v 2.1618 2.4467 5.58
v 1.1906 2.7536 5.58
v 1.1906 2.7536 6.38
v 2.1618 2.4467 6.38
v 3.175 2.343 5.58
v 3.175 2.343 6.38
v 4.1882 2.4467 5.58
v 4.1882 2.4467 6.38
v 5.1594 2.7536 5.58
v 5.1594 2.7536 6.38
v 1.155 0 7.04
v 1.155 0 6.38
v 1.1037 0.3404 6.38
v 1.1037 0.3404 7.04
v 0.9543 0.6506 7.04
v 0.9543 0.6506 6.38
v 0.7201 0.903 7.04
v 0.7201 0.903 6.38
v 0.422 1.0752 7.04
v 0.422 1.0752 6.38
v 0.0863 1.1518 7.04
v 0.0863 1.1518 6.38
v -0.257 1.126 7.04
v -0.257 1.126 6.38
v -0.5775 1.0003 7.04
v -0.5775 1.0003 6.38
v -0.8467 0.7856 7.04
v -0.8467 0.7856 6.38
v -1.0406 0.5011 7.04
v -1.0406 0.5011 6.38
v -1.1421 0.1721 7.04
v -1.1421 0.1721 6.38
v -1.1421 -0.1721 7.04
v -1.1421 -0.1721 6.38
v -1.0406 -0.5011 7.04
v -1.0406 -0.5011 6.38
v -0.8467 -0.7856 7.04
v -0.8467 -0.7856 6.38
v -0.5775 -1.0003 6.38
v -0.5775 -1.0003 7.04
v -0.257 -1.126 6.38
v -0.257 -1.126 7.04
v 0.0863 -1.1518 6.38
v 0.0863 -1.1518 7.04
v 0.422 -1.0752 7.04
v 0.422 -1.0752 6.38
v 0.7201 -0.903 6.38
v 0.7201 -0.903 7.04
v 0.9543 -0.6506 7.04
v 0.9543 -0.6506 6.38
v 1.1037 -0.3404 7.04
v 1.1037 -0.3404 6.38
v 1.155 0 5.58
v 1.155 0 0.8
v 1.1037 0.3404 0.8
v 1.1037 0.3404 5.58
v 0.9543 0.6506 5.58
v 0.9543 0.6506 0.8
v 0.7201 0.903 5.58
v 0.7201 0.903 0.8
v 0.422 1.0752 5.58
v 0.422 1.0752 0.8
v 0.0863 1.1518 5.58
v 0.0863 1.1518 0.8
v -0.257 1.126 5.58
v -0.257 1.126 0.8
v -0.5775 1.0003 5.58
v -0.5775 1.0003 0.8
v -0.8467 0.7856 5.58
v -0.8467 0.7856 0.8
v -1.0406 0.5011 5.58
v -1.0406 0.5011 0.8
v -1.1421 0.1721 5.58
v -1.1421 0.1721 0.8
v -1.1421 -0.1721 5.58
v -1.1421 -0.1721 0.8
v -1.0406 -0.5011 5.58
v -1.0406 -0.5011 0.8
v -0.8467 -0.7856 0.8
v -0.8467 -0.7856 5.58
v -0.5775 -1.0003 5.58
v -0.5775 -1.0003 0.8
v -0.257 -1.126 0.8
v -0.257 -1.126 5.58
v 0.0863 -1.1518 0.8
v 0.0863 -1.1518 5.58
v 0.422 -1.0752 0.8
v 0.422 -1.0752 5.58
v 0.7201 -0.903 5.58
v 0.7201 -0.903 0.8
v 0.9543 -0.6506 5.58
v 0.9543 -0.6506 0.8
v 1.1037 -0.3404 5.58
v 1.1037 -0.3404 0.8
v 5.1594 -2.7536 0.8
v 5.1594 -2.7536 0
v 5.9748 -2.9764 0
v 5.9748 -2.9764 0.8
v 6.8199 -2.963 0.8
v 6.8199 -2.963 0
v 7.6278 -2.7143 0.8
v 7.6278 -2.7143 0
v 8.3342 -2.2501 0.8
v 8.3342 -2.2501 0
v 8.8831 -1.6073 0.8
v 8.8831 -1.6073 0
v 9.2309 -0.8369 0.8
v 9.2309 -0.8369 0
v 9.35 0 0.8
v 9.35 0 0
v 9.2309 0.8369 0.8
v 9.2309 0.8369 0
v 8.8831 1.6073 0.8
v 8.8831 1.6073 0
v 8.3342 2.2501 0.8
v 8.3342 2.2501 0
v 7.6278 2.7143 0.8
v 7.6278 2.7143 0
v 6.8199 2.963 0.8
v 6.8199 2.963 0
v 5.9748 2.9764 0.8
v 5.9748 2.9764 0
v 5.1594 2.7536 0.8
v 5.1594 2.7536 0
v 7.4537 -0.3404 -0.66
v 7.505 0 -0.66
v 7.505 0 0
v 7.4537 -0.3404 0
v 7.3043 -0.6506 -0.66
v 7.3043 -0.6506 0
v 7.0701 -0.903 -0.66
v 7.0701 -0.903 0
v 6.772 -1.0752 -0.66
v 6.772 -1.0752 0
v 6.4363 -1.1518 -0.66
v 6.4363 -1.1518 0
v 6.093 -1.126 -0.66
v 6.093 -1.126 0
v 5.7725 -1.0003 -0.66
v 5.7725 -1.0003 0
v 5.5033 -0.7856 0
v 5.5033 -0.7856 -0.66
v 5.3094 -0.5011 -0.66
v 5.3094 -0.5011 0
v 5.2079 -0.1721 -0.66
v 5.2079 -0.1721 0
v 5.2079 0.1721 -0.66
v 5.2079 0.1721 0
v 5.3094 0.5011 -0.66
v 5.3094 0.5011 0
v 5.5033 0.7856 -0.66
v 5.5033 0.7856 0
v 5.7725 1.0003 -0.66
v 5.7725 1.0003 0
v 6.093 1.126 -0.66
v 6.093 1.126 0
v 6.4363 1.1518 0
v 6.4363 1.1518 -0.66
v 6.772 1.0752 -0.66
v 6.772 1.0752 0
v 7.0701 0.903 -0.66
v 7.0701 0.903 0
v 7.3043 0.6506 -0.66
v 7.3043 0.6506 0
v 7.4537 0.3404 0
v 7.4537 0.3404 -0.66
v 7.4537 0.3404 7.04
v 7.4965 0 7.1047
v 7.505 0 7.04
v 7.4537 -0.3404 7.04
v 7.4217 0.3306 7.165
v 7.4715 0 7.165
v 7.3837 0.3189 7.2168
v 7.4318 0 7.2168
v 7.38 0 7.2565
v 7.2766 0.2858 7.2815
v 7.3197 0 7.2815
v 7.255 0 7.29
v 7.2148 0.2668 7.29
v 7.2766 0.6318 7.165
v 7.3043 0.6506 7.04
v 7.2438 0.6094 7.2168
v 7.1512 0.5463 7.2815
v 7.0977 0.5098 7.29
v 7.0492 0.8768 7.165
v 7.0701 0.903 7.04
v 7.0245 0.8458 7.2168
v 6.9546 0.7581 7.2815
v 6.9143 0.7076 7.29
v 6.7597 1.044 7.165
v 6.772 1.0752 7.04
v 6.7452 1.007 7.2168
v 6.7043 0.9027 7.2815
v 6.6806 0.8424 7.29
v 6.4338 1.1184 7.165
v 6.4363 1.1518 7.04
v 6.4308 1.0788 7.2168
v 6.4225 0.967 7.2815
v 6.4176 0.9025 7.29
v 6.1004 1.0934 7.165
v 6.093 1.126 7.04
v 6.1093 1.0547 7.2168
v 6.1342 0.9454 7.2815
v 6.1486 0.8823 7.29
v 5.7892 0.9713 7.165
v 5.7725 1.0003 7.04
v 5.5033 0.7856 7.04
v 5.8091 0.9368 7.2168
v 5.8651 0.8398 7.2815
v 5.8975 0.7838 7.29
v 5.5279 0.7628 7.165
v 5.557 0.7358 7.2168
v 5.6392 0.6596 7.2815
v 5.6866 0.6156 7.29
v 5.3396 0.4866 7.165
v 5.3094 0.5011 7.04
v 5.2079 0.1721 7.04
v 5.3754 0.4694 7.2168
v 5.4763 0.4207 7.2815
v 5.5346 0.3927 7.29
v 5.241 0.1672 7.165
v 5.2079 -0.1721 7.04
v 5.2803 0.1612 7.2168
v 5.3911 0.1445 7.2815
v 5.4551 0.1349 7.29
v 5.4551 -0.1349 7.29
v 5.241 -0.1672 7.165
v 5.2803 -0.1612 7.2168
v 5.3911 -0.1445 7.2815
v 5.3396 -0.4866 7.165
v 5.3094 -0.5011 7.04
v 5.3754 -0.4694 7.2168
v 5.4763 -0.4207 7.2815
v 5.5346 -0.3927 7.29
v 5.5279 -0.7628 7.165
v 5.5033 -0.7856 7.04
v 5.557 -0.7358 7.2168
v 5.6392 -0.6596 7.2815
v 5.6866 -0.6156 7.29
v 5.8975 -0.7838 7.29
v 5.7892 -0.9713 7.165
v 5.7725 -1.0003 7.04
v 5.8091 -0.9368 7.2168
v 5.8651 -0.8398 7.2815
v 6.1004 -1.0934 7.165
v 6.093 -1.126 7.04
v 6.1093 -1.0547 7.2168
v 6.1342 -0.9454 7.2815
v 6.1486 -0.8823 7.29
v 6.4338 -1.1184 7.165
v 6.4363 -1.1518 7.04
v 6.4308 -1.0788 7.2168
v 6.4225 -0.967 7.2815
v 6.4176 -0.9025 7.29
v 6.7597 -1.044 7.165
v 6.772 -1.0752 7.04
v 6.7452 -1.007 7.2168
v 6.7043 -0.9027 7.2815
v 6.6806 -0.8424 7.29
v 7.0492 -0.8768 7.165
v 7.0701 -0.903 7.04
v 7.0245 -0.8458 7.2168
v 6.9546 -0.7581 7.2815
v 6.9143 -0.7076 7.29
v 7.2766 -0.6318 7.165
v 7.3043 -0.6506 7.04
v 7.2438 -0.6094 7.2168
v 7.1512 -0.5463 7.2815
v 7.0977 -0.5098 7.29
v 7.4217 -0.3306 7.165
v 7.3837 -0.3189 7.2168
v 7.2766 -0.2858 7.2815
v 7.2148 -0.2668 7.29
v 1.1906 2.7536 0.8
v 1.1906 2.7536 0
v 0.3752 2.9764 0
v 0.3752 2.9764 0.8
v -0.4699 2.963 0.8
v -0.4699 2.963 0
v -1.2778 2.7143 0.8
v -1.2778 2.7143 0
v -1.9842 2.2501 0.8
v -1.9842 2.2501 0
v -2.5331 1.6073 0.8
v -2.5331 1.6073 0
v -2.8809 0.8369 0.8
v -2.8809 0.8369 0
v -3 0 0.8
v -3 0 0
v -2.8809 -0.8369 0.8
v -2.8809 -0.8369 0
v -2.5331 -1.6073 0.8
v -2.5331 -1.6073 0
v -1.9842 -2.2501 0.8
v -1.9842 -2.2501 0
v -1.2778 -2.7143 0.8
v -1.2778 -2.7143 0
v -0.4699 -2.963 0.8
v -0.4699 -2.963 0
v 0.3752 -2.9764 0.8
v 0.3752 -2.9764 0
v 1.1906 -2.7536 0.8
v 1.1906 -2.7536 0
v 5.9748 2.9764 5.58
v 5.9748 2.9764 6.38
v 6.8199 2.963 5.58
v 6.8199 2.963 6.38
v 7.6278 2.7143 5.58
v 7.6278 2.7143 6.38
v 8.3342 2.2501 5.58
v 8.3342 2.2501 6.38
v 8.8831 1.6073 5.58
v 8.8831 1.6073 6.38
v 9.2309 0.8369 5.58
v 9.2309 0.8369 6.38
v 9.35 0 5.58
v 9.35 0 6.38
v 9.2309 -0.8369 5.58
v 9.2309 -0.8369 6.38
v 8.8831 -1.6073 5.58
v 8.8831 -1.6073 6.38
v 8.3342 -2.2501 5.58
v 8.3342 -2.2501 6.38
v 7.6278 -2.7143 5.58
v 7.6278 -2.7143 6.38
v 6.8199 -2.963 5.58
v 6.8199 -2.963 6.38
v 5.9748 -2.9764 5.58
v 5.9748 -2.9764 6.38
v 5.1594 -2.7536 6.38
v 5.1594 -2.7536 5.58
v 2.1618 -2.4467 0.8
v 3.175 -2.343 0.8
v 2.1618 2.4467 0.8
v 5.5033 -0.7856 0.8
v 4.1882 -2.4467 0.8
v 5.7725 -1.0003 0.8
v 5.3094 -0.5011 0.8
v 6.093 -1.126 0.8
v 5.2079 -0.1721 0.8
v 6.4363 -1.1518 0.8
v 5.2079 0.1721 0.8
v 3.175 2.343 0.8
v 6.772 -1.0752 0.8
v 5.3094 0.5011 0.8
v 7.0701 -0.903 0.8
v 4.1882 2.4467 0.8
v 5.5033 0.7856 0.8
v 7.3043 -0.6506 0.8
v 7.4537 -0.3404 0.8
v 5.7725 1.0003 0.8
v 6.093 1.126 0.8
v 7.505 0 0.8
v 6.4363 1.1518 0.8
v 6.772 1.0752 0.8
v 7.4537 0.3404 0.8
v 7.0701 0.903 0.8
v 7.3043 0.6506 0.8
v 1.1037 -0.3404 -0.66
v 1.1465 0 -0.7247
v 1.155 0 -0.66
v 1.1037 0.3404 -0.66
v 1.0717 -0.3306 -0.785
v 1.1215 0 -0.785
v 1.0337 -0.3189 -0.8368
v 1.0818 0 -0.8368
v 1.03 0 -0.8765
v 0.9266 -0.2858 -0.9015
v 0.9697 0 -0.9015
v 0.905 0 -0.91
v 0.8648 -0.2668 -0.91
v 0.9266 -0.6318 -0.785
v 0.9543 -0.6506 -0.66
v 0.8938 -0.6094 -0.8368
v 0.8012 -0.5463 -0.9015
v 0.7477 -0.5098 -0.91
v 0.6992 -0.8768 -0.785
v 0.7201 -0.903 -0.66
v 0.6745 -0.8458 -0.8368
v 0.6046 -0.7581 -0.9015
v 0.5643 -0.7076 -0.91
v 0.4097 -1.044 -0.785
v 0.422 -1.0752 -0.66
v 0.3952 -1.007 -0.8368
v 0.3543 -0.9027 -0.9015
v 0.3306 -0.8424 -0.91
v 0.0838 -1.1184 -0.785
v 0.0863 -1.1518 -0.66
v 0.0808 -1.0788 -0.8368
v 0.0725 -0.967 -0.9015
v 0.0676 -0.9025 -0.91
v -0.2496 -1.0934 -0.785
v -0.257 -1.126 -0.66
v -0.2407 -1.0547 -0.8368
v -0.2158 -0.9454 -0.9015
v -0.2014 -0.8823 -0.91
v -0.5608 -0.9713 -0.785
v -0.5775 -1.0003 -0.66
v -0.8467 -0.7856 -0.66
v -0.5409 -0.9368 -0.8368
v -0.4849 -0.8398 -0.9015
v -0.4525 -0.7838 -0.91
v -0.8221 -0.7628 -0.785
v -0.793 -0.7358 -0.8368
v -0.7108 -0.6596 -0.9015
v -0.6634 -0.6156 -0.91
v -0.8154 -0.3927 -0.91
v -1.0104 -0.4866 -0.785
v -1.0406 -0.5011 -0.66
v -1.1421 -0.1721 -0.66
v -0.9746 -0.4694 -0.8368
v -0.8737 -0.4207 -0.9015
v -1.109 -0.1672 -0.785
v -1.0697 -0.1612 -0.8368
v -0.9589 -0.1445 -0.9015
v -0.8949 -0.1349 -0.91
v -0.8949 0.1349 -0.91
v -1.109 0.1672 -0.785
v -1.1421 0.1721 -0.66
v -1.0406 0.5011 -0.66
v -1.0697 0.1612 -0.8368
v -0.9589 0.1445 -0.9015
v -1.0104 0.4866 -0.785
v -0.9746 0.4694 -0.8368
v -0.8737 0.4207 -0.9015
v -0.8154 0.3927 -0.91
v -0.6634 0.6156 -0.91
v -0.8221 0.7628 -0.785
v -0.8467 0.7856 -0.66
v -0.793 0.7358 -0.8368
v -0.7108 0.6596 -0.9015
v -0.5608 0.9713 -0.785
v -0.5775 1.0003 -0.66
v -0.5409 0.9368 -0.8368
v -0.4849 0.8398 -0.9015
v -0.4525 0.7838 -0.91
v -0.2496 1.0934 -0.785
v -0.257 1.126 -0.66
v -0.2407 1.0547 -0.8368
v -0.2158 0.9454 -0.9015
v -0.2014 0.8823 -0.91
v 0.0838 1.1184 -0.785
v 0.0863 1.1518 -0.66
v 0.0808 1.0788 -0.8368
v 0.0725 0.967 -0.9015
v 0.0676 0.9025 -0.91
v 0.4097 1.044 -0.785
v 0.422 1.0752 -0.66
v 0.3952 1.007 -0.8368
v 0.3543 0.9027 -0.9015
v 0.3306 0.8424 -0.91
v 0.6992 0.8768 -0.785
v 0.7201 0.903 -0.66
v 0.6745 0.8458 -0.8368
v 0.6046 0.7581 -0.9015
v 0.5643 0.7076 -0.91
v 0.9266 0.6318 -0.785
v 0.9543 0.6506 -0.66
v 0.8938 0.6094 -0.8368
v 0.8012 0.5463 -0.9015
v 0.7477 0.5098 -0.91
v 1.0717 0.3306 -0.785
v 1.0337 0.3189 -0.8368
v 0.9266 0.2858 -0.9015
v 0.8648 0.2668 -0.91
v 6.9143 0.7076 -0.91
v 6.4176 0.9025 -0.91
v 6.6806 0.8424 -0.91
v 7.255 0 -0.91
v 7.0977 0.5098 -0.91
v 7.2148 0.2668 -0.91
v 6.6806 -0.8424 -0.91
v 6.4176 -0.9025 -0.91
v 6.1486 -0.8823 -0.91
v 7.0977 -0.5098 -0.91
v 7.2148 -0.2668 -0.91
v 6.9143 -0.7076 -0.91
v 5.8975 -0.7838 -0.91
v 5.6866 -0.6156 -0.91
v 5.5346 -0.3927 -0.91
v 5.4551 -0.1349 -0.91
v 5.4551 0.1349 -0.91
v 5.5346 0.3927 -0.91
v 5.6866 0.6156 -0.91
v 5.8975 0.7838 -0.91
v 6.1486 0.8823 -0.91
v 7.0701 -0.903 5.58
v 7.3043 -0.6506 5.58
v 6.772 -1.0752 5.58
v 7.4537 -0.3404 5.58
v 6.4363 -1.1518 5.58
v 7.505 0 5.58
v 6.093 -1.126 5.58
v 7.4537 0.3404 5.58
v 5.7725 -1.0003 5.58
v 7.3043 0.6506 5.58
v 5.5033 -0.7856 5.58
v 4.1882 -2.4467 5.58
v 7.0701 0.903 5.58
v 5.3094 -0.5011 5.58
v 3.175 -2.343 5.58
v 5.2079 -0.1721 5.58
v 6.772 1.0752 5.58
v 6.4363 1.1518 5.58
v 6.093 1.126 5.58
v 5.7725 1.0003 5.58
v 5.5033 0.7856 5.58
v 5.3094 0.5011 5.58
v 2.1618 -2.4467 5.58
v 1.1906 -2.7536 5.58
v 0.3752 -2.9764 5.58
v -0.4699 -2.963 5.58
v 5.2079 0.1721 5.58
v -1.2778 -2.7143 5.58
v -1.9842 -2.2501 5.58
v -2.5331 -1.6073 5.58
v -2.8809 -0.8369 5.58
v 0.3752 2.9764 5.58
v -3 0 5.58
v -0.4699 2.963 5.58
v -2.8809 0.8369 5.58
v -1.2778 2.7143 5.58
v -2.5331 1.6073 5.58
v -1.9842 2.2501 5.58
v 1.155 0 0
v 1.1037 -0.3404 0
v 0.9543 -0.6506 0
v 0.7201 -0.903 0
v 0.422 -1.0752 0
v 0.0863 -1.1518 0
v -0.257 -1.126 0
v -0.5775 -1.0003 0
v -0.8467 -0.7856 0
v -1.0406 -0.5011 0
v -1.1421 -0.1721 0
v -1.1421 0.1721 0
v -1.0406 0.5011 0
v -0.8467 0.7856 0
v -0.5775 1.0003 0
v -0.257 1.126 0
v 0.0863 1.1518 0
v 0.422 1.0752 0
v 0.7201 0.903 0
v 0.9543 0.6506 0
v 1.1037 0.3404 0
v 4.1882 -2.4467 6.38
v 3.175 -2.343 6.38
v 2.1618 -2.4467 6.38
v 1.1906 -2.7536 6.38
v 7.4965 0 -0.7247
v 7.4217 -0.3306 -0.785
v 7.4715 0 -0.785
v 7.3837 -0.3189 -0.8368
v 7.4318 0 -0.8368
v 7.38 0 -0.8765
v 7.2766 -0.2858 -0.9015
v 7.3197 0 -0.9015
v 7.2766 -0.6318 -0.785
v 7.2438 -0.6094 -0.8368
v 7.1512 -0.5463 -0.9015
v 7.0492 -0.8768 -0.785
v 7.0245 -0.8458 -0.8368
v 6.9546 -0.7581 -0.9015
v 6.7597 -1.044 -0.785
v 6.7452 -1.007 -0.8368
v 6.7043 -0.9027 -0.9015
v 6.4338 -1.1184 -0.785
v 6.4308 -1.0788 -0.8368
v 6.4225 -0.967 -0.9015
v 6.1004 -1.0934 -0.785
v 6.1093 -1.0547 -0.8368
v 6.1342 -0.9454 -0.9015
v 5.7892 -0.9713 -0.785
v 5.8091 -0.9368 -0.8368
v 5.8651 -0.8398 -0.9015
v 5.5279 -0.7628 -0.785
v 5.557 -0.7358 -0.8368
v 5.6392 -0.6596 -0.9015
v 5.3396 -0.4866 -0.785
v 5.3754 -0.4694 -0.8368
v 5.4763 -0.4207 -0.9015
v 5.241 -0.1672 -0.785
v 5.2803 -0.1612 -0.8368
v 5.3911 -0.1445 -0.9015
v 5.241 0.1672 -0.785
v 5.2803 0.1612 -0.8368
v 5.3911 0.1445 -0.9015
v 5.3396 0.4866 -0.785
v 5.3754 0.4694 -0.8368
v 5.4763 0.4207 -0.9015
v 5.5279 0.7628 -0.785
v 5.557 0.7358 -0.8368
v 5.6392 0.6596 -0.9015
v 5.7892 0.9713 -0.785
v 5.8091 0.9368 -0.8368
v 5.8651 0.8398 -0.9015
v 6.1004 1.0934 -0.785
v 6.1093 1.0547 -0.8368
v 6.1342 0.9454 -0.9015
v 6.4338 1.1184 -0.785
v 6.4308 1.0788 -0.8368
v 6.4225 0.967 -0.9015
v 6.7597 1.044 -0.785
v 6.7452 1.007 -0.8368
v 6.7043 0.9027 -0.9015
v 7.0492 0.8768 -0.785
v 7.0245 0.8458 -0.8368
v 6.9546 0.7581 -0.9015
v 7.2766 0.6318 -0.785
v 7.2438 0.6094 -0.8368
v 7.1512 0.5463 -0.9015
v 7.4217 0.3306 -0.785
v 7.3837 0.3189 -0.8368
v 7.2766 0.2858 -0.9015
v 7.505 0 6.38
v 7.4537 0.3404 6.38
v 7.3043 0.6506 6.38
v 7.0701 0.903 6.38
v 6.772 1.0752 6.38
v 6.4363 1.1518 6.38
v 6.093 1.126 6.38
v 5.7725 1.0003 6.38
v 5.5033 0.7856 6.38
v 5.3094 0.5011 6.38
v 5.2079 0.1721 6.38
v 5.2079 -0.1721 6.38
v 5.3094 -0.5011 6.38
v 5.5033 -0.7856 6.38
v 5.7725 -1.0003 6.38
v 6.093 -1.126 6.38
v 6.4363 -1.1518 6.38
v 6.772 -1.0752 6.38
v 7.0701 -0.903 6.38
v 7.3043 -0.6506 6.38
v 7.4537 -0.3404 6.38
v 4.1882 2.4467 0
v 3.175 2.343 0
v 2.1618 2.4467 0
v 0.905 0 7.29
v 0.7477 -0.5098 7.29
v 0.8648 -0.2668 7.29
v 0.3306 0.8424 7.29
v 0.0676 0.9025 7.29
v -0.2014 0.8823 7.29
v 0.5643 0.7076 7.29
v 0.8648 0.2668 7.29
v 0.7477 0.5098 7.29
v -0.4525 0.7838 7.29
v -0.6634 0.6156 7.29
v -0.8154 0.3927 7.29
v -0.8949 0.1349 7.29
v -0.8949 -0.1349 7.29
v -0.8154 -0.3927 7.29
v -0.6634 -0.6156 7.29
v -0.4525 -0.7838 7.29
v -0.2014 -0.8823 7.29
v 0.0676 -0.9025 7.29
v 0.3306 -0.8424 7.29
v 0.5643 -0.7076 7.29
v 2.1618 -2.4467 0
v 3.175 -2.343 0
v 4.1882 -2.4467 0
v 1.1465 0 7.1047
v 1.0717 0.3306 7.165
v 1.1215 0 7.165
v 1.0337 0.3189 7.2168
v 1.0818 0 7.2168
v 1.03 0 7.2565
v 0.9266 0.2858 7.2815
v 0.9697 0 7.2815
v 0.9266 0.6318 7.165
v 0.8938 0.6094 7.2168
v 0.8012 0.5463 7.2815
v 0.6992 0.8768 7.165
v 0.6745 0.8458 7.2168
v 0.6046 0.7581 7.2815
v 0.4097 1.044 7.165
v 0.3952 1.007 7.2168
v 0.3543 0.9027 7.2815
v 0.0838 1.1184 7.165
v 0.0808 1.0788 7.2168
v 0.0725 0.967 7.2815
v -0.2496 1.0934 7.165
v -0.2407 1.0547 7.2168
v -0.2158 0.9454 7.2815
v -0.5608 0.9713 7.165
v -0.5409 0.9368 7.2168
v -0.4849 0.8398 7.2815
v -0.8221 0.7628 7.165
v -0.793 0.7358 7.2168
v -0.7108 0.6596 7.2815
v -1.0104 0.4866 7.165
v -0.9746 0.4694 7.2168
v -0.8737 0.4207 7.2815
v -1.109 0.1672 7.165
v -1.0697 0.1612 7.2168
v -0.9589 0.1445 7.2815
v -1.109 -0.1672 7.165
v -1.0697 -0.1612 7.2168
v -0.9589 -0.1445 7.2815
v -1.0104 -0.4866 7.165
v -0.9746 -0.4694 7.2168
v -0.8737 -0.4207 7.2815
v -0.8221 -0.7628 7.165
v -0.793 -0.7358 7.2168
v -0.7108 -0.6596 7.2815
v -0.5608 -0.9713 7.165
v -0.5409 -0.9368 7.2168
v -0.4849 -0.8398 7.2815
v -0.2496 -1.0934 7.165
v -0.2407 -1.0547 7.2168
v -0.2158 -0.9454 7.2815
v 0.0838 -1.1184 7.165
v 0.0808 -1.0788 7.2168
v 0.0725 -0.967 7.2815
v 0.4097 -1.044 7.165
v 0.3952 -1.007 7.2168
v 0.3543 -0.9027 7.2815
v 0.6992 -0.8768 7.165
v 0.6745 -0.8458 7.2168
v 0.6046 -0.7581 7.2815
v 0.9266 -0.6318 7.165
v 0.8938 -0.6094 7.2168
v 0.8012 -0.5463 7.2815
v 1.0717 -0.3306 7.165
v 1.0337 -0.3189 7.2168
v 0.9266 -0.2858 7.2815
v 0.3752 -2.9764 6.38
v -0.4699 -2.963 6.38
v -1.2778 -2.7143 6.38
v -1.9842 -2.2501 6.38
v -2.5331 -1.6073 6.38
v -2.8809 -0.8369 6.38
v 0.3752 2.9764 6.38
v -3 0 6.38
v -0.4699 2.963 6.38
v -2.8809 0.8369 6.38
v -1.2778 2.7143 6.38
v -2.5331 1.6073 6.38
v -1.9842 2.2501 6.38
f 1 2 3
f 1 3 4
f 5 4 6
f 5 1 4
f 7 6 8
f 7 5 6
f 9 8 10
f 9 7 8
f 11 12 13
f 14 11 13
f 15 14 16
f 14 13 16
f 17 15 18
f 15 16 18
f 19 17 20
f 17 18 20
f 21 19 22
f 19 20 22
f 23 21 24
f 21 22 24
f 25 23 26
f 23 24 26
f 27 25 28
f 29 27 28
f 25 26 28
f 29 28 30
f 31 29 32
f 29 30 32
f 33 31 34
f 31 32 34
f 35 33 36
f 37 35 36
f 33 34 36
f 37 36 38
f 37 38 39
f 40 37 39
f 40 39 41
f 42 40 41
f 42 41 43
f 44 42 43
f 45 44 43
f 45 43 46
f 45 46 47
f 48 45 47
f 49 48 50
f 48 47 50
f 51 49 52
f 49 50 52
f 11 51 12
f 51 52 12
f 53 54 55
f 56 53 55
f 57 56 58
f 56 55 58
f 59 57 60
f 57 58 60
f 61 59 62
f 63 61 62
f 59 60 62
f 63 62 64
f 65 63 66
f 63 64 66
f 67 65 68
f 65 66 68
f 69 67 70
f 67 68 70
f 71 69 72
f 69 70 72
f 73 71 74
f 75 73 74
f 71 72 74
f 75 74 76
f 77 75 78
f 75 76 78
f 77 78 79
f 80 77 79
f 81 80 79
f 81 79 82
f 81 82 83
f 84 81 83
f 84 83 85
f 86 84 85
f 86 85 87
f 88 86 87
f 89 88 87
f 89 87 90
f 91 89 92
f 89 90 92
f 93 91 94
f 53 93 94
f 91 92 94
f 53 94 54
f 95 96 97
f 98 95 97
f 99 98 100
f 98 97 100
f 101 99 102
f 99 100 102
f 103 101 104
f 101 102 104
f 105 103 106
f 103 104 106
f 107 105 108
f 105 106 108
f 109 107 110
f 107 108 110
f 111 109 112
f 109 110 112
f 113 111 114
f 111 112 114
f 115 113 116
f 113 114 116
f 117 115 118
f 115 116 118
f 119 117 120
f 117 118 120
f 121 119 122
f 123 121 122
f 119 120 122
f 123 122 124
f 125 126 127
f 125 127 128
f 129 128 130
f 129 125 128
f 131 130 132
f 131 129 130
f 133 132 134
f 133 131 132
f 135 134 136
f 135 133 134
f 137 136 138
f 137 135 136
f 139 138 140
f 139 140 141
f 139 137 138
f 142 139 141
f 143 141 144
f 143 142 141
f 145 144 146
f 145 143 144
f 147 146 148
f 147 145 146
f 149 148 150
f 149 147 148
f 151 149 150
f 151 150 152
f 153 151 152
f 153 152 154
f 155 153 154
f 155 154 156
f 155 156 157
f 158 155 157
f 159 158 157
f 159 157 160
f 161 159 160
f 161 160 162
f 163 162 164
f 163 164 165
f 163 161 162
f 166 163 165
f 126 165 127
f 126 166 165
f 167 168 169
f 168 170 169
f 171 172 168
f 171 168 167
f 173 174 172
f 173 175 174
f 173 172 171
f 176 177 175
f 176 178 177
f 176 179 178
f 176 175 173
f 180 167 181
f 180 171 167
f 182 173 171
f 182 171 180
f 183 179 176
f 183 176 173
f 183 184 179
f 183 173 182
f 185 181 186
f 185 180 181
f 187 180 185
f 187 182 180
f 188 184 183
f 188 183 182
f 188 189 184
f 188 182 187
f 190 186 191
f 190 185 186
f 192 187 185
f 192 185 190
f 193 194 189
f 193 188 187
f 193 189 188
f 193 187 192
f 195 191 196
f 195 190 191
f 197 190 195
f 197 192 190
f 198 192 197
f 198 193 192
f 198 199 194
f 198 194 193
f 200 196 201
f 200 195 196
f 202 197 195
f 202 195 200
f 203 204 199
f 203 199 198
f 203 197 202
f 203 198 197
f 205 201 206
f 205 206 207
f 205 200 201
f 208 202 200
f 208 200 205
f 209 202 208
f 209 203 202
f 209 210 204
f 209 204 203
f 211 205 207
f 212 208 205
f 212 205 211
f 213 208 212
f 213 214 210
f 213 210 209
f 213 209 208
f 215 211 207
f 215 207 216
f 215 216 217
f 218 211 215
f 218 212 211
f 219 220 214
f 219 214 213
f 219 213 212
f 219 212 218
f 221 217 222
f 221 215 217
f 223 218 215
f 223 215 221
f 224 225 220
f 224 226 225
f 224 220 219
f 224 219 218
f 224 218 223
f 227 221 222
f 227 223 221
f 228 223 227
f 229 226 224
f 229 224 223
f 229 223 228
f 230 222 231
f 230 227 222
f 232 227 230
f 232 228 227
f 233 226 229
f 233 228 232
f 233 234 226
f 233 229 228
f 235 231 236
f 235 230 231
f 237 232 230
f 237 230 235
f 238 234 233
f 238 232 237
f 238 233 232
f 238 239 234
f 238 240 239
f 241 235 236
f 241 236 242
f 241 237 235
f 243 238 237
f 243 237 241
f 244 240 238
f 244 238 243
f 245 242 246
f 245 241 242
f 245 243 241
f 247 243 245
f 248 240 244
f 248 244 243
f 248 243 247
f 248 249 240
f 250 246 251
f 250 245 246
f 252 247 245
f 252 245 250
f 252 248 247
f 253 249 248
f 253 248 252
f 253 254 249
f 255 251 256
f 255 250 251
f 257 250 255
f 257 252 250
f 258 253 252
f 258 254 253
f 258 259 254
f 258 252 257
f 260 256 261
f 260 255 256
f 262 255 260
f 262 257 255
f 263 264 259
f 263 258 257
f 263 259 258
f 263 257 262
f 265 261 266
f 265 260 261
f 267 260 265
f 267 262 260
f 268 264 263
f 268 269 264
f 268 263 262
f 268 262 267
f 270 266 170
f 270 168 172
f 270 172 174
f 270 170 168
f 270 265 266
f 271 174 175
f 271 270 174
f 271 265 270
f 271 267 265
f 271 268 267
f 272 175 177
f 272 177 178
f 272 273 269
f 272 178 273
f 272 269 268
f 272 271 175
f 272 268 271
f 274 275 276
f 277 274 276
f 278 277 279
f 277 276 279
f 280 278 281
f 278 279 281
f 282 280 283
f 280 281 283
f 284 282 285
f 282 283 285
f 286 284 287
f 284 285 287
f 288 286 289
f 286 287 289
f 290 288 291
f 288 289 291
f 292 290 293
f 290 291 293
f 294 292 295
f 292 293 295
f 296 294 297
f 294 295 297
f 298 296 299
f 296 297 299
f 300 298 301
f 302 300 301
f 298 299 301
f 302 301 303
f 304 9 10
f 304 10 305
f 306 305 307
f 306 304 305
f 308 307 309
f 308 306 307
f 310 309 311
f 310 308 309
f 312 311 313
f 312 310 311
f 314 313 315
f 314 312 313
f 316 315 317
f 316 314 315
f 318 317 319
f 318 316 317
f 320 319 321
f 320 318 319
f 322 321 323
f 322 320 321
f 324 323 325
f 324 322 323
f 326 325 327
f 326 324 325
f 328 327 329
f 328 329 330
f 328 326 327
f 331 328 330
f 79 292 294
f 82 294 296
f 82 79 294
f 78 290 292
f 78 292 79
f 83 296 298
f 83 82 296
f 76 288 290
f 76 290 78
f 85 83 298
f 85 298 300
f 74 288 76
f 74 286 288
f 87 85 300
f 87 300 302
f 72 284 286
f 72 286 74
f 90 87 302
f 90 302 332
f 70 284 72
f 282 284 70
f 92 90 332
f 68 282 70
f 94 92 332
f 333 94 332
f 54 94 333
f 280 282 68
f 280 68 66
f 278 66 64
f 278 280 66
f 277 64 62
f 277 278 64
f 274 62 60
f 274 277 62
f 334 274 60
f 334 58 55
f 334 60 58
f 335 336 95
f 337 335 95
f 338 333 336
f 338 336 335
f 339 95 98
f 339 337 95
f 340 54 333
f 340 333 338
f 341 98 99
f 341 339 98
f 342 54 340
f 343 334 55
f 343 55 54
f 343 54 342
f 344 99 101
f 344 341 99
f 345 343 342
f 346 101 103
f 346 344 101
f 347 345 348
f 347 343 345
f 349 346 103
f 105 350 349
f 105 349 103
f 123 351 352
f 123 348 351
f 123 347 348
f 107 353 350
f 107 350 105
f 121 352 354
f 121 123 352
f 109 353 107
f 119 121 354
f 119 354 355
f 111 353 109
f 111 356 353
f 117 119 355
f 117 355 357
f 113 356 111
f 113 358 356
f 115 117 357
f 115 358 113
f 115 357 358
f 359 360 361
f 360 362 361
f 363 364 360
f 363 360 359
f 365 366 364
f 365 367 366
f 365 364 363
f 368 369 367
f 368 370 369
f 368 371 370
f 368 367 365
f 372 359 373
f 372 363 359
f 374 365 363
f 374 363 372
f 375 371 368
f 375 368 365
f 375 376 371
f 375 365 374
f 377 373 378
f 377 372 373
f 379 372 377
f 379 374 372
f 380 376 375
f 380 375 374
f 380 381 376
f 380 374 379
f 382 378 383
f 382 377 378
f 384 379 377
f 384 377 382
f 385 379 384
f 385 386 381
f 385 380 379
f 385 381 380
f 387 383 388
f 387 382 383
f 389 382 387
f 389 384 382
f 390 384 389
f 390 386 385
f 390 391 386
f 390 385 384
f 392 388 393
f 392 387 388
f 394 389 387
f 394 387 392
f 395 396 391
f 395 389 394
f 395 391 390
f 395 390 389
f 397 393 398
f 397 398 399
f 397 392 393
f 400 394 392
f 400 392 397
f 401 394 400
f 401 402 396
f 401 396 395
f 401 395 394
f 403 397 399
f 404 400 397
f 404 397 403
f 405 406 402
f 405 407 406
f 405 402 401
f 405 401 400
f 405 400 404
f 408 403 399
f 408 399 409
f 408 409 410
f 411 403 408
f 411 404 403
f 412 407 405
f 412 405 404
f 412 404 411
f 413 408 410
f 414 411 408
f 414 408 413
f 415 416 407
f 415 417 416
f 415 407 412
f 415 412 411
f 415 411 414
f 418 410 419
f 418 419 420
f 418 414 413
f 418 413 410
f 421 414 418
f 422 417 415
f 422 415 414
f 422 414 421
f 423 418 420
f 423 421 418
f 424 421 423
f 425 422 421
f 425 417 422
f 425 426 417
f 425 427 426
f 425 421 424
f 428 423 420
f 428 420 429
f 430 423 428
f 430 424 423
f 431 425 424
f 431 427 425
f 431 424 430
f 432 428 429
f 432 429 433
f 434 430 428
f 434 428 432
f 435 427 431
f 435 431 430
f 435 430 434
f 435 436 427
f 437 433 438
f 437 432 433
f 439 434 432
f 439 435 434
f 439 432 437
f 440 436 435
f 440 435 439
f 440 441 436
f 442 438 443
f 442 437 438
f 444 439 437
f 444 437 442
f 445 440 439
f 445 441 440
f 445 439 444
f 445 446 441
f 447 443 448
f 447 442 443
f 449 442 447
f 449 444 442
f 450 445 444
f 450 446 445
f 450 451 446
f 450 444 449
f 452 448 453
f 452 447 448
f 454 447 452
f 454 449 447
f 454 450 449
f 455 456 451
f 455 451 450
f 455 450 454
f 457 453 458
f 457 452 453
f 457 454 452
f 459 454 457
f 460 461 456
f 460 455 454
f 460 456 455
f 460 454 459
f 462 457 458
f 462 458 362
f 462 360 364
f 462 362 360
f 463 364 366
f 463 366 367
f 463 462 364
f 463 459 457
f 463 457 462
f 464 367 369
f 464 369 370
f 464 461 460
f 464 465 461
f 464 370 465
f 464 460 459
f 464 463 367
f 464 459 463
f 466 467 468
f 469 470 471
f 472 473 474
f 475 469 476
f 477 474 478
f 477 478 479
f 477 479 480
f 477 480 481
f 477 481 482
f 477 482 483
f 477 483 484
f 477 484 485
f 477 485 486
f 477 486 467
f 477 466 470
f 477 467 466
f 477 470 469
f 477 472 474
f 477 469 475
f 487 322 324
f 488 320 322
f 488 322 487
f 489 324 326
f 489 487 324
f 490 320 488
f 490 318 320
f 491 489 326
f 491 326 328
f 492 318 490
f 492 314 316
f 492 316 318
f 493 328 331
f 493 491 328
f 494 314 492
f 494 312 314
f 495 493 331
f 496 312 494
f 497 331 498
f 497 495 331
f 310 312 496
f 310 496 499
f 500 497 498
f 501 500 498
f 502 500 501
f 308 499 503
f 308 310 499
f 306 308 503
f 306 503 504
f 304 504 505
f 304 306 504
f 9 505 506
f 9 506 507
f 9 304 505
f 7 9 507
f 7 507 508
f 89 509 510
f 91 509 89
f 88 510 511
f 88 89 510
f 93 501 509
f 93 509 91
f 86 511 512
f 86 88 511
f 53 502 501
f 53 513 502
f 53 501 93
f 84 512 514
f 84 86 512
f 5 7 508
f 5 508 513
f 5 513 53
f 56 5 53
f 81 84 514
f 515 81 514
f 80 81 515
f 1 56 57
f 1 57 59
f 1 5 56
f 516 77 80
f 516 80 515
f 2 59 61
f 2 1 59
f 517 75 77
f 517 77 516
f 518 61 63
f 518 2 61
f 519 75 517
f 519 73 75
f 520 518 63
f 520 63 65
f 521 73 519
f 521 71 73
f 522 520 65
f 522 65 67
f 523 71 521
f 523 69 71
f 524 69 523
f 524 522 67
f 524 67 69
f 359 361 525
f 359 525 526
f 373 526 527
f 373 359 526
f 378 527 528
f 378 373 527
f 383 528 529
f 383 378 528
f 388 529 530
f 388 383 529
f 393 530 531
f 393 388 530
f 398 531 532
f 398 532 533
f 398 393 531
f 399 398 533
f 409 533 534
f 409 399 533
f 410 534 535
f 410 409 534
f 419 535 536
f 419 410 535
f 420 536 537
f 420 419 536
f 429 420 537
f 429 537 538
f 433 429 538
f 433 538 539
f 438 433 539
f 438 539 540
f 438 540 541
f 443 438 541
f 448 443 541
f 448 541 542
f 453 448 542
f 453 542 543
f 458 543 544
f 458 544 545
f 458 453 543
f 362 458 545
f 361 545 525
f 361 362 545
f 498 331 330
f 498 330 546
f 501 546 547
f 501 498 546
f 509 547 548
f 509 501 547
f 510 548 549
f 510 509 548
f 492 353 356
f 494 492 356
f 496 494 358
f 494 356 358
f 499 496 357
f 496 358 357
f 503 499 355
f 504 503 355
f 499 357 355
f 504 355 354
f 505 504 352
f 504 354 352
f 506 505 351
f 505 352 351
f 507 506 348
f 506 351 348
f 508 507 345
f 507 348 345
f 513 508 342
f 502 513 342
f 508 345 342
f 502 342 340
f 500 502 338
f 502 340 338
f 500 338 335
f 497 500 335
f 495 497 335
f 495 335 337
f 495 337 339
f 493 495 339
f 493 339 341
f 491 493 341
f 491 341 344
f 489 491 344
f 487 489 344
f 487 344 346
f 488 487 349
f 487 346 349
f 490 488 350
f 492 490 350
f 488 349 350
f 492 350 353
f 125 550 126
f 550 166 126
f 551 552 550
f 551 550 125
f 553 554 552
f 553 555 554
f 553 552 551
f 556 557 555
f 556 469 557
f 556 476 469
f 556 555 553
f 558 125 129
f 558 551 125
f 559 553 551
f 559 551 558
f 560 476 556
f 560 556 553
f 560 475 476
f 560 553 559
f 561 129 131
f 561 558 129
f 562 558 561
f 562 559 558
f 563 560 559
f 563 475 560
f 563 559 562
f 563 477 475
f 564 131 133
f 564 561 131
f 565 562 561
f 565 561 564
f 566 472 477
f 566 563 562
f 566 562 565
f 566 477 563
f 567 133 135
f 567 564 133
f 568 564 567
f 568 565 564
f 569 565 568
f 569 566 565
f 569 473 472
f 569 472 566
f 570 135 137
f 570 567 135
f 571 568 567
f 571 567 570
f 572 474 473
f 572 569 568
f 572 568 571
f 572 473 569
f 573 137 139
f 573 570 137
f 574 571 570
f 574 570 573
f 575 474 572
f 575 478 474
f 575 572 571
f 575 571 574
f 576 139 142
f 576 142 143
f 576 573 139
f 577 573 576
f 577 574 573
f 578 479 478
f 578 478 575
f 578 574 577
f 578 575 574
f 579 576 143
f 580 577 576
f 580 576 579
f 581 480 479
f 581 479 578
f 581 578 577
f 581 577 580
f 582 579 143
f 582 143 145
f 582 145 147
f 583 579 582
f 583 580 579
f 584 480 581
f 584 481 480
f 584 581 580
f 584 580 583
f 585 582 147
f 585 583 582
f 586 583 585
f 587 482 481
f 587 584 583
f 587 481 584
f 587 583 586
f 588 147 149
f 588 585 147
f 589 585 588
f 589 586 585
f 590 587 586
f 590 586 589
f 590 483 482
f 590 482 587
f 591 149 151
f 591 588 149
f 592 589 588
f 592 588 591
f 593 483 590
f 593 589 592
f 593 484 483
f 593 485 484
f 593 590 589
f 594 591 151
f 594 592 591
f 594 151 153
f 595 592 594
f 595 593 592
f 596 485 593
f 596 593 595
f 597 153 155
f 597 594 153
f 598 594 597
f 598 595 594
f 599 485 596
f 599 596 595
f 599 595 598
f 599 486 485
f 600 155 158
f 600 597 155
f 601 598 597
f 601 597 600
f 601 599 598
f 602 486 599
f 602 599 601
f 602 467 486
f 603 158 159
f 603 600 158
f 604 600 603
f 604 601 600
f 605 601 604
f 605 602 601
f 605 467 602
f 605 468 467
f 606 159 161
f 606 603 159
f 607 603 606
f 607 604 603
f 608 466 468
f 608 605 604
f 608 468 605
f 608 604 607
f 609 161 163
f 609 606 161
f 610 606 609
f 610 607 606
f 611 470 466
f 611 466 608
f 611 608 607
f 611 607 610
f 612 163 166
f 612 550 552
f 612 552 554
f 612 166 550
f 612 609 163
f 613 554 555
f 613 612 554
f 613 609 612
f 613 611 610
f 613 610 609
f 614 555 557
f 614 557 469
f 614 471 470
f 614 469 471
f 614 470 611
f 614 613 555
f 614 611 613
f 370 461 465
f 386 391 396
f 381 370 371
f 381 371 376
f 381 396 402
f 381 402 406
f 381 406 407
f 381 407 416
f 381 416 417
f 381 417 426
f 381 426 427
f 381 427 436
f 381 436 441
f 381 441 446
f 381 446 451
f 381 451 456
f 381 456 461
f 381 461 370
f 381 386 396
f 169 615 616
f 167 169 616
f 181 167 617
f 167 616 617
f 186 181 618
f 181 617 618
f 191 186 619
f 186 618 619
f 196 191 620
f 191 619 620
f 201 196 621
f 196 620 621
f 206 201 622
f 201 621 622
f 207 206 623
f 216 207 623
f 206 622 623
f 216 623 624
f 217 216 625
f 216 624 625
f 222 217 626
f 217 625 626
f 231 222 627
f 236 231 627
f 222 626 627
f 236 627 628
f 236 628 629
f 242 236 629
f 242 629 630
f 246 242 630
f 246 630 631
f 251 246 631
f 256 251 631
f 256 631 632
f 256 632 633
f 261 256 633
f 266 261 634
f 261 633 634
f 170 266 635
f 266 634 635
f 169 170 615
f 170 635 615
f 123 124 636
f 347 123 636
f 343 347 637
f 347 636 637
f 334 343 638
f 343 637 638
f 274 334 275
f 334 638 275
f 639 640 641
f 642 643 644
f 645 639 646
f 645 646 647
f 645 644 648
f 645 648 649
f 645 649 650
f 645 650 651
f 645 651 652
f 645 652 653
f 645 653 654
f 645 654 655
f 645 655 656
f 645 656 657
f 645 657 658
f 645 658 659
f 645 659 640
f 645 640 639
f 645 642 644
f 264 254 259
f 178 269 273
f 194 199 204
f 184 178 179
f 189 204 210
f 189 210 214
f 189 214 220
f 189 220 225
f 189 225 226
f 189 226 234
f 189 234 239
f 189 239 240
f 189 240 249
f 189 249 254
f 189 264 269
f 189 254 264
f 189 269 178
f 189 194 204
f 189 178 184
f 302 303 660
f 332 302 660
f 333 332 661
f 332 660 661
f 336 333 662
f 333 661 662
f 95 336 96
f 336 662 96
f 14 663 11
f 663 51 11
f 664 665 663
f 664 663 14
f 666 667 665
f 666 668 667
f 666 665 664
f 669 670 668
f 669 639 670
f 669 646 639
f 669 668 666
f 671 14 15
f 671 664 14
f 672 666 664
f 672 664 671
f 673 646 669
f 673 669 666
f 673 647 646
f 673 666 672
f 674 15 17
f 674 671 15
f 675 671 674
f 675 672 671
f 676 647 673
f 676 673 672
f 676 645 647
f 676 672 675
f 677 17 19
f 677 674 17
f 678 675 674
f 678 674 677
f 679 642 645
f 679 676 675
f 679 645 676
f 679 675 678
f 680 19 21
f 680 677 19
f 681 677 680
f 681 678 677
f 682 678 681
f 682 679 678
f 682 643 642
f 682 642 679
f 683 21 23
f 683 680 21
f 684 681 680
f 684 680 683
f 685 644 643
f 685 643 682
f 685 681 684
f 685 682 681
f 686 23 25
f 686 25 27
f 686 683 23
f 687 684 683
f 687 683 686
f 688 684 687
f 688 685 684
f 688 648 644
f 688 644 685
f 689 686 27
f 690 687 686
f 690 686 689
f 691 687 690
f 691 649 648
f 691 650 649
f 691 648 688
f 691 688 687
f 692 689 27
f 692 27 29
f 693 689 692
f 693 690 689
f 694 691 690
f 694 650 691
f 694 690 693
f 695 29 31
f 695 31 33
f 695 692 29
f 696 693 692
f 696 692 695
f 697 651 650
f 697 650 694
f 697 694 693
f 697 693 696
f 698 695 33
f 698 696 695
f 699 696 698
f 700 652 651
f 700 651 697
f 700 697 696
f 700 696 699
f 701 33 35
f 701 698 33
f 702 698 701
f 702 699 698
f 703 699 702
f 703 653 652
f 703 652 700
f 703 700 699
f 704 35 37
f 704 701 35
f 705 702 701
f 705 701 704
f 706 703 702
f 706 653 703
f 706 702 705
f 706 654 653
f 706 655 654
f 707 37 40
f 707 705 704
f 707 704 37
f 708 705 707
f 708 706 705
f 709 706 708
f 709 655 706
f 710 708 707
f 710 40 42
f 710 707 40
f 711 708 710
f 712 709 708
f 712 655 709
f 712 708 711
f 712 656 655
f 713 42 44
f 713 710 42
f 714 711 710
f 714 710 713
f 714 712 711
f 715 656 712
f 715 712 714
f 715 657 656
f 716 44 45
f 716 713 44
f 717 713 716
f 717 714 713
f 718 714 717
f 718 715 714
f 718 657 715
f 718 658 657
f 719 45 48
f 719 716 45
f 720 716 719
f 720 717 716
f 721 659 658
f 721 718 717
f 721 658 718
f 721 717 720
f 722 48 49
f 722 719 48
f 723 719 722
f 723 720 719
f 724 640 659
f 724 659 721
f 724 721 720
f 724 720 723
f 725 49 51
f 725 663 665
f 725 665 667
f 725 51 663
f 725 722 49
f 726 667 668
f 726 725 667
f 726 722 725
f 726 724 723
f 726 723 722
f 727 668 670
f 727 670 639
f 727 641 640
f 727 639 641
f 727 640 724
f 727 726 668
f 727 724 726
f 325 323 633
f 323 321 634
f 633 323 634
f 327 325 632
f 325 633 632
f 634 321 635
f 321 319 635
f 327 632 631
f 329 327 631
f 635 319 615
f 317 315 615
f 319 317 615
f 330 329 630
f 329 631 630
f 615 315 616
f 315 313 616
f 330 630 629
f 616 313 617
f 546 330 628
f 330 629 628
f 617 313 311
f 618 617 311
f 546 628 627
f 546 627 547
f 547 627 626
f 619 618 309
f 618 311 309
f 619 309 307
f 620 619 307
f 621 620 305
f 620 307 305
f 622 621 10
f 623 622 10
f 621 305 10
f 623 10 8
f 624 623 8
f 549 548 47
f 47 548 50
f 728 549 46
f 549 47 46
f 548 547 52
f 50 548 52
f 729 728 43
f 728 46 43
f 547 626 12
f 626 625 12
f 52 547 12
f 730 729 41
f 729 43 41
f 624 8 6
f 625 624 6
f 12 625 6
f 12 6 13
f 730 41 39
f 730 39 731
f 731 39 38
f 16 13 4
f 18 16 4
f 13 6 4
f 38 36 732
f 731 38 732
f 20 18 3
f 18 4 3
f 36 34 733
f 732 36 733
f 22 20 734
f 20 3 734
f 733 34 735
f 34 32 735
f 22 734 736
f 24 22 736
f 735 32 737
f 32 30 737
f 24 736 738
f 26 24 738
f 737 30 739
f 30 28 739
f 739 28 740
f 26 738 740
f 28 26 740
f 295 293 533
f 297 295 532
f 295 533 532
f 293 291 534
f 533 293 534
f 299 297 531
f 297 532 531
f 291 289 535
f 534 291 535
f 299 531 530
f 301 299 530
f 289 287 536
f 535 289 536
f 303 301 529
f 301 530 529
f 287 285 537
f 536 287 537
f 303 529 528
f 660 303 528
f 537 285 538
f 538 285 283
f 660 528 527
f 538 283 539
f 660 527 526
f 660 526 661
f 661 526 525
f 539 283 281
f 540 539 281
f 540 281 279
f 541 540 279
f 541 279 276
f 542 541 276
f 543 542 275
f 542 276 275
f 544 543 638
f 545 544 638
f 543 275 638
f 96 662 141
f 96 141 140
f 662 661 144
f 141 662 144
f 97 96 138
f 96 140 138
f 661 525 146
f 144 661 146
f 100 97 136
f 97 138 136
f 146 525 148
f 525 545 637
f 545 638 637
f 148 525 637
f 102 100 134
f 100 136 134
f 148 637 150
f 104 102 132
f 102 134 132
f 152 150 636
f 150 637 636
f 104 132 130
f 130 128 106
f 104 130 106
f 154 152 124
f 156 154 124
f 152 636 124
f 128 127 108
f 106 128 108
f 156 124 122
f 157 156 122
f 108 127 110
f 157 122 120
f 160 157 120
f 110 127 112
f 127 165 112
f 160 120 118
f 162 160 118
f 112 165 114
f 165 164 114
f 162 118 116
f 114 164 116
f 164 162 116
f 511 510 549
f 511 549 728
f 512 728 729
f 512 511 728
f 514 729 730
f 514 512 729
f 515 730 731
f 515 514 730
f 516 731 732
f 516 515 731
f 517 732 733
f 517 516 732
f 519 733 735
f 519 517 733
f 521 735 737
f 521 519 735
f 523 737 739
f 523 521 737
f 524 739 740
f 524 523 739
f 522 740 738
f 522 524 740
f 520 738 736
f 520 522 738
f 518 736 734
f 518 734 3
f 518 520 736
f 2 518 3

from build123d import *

# Parameters (mm, degrees)
EXTRUDE_1_DEPTH = 0.8
SKETCH_2_R      = 1.155
EXTRUDE_2_DEPTH = 4.78
EXTRUDE_3_DEPTH = 0.8
SKETCH_4_R      = 1.155
EXTRUDE_4_DEPTH = 0.91
EXTRUDE_START   = 0.91
SKETCH_5_R      = 1.155
EXTRUDE_5_DEPTH = 0.91
FILLET_1_R      = 0.25


with BuildPart() as part:
    # 草图1 → 凸台-拉伸1 (new body)
    with BuildSketch(Plane.XY):
        with BuildLine():
            ThreePointArc((1.190625, 2.753618004), (-3, 0), (1.190625, -2.753618004))
            ThreePointArc((1.190625, -2.753618004), (3.175, -2.342981343), (5.159375, -2.753618004))
            ThreePointArc((5.159375, -2.753618004), (9.35, 0), (5.159375, 2.753618004))
            ThreePointArc((5.159375, 2.753618004), (3.175, 2.342981343), (1.190625, 2.753618004))
        make_face()
    extrude(amount=EXTRUDE_1_DEPTH)

    # 草图2 → 凸台-拉伸2 (add)
    with BuildSketch(Plane.XY.offset(0.8)):
        Circle(SKETCH_2_R)
        with Locations((6.35, 0)):
            Circle(SKETCH_2_R)
    extrude(amount=EXTRUDE_2_DEPTH)

    # 草图3 → 凸台-拉伸3 (add)
    with BuildSketch(Plane.XY.offset(5.58)):
        with BuildLine():
            ThreePointArc((5.159375, -2.753618004), (3.175, -2.342981343), (1.190625, -2.753618004))
            ThreePointArc((1.190625, -2.753618004), (-3, 0), (1.190625, 2.753618004))
            ThreePointArc((1.190625, 2.753618004), (3.175, 2.342981343), (5.159375, 2.753618004))
            ThreePointArc((5.159375, 2.753618004), (9.35, 0), (5.159375, -2.753618004))
        make_face()
    extrude(amount=EXTRUDE_3_DEPTH)

    # 草图4 → 凸台-拉伸4 (add)
    with BuildSketch(Plane.XY.offset(6.38)):
        Circle(SKETCH_4_R)
        with Locations((6.35, 0)):
            Circle(SKETCH_4_R)
    extrude(amount=EXTRUDE_4_DEPTH)

    # 草图5 → 凸台-拉伸5 (add)
    with BuildSketch(Plane(origin=(0, 0, 0), x_dir=(-1, 0, 0), z_dir=(0, 0, -1)).offset(EXTRUDE_START)):
        with Locations(Location((0, 0, 0), (0, 0, 180))):
            Circle(SKETCH_5_R)
        with Locations(Location((-6.35, 0, 0), (0, 0, 180))):
            Circle(SKETCH_5_R)
    extrude(amount=-EXTRUDE_5_DEPTH)

    # 圆角1
    fillet_1_edges = [part.edges().sort_by_distance(p)[0] for p in [
        (-1.155, 0, 7.29),
        (5.195, 0, 7.29),
        (-1.155, 0, -0.91),
        (5.195, 0, -0.91),
    ]]
    fillet(fillet_1_edges, radius=FILLET_1_R)


solid = part.part
